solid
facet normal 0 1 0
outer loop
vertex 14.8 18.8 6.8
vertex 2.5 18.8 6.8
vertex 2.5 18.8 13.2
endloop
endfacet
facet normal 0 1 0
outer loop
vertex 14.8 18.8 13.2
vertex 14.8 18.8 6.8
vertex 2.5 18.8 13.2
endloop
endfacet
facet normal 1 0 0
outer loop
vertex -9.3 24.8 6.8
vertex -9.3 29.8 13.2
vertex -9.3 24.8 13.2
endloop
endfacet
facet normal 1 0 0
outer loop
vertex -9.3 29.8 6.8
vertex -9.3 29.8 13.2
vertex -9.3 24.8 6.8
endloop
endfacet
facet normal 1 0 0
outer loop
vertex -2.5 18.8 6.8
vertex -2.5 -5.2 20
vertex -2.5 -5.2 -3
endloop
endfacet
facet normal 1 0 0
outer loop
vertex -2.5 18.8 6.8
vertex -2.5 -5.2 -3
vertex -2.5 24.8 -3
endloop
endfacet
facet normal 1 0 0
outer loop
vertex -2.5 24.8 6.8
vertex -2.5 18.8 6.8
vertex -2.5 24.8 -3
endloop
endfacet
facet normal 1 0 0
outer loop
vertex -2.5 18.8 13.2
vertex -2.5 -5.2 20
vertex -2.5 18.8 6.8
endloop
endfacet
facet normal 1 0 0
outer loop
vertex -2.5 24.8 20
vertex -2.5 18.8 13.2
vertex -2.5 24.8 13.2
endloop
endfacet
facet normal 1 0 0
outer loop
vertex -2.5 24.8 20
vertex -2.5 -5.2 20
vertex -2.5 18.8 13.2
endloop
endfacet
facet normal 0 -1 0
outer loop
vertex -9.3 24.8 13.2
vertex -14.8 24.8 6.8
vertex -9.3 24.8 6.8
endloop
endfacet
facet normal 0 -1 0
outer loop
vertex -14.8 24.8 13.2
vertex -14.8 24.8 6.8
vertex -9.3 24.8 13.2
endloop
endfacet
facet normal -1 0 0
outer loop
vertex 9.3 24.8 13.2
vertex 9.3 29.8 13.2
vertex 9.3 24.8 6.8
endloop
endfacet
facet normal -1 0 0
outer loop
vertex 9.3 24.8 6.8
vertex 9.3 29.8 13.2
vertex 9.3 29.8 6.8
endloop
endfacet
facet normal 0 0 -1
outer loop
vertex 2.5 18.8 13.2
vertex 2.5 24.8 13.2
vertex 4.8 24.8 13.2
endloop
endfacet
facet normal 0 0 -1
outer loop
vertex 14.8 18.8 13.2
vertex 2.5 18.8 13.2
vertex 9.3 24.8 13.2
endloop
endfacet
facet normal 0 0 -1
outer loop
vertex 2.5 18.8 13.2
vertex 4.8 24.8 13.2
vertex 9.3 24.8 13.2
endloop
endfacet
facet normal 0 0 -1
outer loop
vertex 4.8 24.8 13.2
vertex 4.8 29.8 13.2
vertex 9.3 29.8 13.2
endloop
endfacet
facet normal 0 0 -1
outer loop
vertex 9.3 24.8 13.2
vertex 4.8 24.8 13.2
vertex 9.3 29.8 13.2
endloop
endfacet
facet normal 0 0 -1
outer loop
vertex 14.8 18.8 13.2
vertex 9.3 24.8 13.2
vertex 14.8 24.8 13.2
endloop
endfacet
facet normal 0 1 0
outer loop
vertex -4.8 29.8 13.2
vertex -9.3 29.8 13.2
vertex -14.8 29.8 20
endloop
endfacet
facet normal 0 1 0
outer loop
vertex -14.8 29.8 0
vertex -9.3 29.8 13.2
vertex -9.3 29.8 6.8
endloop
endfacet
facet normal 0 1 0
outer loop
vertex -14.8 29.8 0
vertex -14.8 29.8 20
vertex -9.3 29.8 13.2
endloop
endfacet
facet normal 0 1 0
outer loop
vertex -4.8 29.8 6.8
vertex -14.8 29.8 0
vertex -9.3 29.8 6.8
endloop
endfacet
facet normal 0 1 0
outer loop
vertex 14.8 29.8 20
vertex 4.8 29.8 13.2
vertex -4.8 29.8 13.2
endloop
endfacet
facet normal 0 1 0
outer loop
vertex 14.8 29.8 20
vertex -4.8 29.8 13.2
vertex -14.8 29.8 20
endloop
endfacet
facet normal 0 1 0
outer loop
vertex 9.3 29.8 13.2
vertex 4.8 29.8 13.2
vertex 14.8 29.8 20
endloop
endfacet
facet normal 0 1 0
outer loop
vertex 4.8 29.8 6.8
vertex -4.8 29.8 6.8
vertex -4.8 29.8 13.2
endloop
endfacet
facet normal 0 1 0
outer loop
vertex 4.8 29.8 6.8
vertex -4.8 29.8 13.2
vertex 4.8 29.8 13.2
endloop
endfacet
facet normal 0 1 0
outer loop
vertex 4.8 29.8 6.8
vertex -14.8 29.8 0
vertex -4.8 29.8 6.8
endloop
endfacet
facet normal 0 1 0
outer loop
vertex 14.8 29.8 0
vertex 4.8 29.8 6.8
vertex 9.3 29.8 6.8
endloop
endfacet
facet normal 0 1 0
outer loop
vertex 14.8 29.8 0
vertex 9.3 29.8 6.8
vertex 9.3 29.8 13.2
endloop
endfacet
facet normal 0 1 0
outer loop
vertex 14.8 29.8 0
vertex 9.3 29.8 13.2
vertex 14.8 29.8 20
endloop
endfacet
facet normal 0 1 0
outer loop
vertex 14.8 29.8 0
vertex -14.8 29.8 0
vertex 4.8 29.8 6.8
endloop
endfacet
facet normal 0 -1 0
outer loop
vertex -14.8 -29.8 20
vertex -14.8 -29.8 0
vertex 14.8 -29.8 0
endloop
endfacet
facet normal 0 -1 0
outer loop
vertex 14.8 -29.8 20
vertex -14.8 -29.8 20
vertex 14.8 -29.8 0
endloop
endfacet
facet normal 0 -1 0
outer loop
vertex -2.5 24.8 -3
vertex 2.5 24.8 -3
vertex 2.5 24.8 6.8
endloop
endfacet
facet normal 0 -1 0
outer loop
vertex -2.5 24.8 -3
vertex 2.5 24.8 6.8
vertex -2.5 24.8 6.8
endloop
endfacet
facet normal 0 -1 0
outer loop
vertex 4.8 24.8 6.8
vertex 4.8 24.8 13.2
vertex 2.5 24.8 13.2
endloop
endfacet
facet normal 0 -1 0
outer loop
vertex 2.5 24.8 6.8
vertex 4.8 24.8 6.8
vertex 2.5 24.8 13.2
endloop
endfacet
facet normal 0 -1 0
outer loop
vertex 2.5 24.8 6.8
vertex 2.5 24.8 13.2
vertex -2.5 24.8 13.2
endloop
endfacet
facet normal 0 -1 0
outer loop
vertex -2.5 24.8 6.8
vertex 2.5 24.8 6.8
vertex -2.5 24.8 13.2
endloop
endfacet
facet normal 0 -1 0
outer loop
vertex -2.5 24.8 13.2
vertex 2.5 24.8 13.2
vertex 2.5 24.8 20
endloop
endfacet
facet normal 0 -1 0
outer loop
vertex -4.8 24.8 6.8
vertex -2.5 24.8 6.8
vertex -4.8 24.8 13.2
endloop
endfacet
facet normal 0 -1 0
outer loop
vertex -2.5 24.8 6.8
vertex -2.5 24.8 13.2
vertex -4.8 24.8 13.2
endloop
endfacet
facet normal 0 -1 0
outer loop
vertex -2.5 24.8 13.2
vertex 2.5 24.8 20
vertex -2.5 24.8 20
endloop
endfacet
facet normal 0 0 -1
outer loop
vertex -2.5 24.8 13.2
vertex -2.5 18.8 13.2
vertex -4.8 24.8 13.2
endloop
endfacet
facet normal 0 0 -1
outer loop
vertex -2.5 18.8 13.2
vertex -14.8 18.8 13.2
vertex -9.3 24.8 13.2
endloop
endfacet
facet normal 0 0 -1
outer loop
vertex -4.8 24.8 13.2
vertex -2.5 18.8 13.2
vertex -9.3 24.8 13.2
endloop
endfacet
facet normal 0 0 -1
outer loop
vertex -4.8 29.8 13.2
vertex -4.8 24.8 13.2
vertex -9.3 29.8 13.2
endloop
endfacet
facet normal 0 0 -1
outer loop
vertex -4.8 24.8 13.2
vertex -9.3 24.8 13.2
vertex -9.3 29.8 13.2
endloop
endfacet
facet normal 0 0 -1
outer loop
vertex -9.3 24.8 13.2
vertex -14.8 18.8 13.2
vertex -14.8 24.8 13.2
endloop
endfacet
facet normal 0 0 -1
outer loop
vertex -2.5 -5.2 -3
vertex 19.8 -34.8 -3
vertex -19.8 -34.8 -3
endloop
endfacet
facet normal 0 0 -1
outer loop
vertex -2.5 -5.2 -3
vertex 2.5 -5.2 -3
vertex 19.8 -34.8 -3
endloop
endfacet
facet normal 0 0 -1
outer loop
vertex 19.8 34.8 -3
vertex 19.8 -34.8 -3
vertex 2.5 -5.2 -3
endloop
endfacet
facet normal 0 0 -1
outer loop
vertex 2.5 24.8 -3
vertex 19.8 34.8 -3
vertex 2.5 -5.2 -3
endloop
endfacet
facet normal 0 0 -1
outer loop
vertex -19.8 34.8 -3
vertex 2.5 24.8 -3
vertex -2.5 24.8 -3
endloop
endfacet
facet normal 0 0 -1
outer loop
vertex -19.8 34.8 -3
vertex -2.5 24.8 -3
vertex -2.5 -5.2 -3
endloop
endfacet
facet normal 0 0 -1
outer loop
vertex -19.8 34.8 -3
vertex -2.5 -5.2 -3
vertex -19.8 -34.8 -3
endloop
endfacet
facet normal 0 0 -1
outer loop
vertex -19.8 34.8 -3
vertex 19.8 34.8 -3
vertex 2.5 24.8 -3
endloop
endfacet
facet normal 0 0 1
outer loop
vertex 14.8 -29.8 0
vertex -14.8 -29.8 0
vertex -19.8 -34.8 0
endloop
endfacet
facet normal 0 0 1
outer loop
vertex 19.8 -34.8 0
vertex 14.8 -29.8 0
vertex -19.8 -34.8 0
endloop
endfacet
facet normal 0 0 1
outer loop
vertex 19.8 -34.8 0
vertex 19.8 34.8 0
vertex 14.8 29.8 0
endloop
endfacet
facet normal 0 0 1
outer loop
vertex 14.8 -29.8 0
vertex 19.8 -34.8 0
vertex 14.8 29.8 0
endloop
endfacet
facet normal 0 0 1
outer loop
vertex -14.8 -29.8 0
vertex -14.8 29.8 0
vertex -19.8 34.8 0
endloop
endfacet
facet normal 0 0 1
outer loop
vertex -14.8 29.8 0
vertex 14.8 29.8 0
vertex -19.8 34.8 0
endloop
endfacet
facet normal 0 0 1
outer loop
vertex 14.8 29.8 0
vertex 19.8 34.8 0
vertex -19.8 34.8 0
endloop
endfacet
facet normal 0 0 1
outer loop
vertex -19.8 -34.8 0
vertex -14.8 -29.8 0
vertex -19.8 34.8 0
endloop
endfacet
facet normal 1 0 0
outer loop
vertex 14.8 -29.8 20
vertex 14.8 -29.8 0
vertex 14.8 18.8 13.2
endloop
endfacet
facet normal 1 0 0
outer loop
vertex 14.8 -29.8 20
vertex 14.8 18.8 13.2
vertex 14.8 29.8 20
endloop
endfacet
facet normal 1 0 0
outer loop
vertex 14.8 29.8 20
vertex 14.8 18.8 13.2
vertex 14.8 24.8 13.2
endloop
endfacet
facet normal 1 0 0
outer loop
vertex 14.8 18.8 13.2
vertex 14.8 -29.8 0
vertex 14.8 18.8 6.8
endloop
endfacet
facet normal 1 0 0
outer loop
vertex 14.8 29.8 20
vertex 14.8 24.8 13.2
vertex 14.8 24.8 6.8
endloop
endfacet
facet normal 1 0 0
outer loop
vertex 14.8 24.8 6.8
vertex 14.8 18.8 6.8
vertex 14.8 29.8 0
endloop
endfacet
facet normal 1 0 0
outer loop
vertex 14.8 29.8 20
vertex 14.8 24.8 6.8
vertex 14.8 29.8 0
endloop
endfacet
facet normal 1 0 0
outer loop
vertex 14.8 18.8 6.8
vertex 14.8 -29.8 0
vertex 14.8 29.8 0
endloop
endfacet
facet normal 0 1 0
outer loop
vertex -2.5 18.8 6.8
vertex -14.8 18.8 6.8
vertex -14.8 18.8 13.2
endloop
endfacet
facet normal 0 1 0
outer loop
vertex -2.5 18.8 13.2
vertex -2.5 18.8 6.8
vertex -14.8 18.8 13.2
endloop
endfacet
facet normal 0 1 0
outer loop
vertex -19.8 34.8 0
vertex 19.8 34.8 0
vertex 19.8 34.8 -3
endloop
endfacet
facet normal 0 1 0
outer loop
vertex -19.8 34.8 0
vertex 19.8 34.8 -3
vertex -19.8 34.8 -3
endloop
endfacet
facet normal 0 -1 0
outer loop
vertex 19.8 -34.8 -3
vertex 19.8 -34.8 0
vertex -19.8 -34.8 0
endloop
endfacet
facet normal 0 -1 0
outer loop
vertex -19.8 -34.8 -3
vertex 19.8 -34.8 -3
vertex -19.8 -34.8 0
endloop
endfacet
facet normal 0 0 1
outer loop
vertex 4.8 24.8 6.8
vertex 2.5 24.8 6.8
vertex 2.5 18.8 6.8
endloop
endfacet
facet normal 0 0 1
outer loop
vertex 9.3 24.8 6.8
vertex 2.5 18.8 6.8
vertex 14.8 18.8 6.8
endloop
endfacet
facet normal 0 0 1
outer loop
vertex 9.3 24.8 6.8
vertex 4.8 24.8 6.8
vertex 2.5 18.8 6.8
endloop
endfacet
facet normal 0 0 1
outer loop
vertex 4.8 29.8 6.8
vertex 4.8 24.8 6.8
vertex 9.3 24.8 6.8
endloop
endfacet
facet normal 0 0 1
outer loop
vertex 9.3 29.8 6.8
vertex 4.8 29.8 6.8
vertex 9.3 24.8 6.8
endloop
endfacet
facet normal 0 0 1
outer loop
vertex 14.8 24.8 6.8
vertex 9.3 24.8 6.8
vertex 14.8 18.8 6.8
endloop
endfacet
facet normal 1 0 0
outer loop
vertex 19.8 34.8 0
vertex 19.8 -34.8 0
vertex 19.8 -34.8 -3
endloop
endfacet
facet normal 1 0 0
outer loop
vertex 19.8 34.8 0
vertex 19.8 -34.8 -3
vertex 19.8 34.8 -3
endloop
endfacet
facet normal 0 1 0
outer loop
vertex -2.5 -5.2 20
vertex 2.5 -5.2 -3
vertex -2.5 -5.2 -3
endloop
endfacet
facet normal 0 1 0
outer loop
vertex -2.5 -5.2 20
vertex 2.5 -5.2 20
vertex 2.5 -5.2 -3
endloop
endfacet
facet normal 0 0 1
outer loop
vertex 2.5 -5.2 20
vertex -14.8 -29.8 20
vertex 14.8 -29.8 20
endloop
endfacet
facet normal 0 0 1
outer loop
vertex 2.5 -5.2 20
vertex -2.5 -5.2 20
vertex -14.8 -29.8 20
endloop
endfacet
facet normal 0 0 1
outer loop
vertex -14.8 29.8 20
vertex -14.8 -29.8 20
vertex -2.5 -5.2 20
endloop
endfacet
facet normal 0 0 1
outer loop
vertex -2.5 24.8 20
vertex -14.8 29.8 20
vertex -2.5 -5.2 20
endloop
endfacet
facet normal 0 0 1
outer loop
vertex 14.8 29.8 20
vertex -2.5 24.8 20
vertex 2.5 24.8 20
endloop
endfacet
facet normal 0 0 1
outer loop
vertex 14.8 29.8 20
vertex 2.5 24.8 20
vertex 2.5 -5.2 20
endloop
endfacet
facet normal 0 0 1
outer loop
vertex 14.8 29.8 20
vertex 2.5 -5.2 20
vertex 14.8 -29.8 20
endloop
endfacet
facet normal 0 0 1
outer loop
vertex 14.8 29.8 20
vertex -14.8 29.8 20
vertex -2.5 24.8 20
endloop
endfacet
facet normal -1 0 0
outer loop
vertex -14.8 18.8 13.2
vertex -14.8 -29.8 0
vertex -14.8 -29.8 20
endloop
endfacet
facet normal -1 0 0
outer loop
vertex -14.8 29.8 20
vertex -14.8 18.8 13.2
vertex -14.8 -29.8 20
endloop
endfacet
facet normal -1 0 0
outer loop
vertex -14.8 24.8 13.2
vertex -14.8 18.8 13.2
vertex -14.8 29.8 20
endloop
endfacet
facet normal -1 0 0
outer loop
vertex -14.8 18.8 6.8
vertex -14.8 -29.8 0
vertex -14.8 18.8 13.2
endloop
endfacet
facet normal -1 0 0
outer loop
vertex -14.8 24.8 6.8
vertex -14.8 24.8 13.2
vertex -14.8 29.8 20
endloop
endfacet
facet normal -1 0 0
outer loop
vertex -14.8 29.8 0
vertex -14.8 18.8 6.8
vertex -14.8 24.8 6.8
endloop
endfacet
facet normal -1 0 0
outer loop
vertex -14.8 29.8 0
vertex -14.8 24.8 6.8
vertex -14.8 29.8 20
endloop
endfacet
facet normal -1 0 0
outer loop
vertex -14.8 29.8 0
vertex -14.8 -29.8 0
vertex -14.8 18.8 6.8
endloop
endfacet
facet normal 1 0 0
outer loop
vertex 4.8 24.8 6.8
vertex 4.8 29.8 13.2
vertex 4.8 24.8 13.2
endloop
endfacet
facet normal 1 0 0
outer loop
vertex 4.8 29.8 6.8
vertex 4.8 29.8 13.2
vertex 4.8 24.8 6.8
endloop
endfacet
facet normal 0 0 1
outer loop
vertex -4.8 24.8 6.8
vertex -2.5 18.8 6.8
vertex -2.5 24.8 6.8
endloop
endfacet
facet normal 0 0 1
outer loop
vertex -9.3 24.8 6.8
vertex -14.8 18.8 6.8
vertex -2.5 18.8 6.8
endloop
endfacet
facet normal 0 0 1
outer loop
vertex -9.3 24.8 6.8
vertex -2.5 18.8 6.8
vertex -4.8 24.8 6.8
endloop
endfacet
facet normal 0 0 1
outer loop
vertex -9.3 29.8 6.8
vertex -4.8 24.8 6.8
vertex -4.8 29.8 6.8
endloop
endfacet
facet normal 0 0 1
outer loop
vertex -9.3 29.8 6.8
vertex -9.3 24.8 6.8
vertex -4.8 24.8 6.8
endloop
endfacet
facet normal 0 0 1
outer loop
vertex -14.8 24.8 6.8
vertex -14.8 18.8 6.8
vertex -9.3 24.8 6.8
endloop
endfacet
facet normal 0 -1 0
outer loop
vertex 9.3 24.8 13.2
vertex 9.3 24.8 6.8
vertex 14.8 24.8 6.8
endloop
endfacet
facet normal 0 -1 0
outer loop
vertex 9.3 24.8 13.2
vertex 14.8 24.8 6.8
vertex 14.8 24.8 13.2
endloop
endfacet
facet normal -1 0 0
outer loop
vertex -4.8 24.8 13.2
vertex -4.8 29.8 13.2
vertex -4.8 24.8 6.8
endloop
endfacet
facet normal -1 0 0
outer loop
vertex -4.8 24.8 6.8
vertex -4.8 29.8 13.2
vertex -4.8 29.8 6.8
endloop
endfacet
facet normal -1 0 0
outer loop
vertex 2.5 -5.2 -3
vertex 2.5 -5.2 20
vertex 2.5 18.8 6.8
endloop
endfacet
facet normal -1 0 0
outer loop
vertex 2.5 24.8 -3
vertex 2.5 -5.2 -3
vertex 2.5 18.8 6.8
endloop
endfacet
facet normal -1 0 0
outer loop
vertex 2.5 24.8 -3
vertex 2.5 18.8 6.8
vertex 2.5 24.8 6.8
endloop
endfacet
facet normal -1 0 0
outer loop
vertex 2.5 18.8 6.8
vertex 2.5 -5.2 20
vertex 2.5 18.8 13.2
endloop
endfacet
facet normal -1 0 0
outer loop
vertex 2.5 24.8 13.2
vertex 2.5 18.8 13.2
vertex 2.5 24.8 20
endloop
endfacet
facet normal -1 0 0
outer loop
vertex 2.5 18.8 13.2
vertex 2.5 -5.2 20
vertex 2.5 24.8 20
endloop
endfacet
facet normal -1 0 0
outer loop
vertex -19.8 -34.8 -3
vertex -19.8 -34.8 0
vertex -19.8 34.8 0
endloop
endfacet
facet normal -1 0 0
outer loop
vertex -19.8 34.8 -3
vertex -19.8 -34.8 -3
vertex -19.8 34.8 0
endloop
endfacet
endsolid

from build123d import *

# Parameters (mm, degrees)
SKETCH_1_W          = 29.6
SKETCH_1_H          = 59.6
SKETCH_1_W_2        = 5
SKETCH_1_H_2        = 30
EXTRUDE_1_DEPTH     = 20
SKETCH_2_W          = 39.6
SKETCH_2_H          = 69.6
SKETCH_2_W_2        = 5
SKETCH_2_H_2        = 30
EXTRUDE_2_DEPTH     = 3
SKETCH_3_W          = 4.5
SKETCH_3_H          = 6.4
CUT_EXTRUDE_1_DEPTH = 11
SKETCH_5_W          = 6.4
SKETCH_5_H          = 6
CUT_EXTRUDE_2_DEPTH = 35.6


with BuildPart() as part:
    # 스케치1 → 보스-돌출1 (new body)
    with BuildSketch(Plane.XY):
        Rectangle(SKETCH_1_W, SKETCH_1_H)
        with Locations((0, 9.8)):
            Rectangle(SKETCH_1_W_2, SKETCH_1_H_2, mode=Mode.SUBTRACT)
    extrude(amount=EXTRUDE_1_DEPTH)

    # 스케치2 → 보스-돌출2 (add)
    with BuildSketch(Plane(origin=(0, 0, 0), x_dir=(-1, 0, 0), z_dir=(0, 0, -1))):
        Rectangle(SKETCH_2_W, SKETCH_2_H)
        with Locations((0, 9.8)):
            Rectangle(SKETCH_2_W_2, SKETCH_2_H_2, mode=Mode.SUBTRACT)
    extrude(amount=EXTRUDE_2_DEPTH)

    # 스케치3 → 컷-돌출1 (cut)
    with BuildSketch(Plane(origin=(0, 29.8, 0), x_dir=(1, 0, 0), z_dir=(0, 1, 0))):
        with Locations((-7.05, -10)):
            Rectangle(SKETCH_3_W, SKETCH_3_H)
        with Locations((7.05, -10)):
            Rectangle(SKETCH_3_W, SKETCH_3_H)
    extrude(amount=-CUT_EXTRUDE_1_DEPTH, mode=Mode.SUBTRACT)

    # 스케치5 → 컷-돌출2 (cut, through all)
    with BuildSketch(Plane.ZY.offset(14.8)):
        with Locations((10, 21.8)):
            Rectangle(SKETCH_5_W, SKETCH_5_H)
    extrude(amount=-CUT_EXTRUDE_2_DEPTH, mode=Mode.SUBTRACT)


solid = part.part
